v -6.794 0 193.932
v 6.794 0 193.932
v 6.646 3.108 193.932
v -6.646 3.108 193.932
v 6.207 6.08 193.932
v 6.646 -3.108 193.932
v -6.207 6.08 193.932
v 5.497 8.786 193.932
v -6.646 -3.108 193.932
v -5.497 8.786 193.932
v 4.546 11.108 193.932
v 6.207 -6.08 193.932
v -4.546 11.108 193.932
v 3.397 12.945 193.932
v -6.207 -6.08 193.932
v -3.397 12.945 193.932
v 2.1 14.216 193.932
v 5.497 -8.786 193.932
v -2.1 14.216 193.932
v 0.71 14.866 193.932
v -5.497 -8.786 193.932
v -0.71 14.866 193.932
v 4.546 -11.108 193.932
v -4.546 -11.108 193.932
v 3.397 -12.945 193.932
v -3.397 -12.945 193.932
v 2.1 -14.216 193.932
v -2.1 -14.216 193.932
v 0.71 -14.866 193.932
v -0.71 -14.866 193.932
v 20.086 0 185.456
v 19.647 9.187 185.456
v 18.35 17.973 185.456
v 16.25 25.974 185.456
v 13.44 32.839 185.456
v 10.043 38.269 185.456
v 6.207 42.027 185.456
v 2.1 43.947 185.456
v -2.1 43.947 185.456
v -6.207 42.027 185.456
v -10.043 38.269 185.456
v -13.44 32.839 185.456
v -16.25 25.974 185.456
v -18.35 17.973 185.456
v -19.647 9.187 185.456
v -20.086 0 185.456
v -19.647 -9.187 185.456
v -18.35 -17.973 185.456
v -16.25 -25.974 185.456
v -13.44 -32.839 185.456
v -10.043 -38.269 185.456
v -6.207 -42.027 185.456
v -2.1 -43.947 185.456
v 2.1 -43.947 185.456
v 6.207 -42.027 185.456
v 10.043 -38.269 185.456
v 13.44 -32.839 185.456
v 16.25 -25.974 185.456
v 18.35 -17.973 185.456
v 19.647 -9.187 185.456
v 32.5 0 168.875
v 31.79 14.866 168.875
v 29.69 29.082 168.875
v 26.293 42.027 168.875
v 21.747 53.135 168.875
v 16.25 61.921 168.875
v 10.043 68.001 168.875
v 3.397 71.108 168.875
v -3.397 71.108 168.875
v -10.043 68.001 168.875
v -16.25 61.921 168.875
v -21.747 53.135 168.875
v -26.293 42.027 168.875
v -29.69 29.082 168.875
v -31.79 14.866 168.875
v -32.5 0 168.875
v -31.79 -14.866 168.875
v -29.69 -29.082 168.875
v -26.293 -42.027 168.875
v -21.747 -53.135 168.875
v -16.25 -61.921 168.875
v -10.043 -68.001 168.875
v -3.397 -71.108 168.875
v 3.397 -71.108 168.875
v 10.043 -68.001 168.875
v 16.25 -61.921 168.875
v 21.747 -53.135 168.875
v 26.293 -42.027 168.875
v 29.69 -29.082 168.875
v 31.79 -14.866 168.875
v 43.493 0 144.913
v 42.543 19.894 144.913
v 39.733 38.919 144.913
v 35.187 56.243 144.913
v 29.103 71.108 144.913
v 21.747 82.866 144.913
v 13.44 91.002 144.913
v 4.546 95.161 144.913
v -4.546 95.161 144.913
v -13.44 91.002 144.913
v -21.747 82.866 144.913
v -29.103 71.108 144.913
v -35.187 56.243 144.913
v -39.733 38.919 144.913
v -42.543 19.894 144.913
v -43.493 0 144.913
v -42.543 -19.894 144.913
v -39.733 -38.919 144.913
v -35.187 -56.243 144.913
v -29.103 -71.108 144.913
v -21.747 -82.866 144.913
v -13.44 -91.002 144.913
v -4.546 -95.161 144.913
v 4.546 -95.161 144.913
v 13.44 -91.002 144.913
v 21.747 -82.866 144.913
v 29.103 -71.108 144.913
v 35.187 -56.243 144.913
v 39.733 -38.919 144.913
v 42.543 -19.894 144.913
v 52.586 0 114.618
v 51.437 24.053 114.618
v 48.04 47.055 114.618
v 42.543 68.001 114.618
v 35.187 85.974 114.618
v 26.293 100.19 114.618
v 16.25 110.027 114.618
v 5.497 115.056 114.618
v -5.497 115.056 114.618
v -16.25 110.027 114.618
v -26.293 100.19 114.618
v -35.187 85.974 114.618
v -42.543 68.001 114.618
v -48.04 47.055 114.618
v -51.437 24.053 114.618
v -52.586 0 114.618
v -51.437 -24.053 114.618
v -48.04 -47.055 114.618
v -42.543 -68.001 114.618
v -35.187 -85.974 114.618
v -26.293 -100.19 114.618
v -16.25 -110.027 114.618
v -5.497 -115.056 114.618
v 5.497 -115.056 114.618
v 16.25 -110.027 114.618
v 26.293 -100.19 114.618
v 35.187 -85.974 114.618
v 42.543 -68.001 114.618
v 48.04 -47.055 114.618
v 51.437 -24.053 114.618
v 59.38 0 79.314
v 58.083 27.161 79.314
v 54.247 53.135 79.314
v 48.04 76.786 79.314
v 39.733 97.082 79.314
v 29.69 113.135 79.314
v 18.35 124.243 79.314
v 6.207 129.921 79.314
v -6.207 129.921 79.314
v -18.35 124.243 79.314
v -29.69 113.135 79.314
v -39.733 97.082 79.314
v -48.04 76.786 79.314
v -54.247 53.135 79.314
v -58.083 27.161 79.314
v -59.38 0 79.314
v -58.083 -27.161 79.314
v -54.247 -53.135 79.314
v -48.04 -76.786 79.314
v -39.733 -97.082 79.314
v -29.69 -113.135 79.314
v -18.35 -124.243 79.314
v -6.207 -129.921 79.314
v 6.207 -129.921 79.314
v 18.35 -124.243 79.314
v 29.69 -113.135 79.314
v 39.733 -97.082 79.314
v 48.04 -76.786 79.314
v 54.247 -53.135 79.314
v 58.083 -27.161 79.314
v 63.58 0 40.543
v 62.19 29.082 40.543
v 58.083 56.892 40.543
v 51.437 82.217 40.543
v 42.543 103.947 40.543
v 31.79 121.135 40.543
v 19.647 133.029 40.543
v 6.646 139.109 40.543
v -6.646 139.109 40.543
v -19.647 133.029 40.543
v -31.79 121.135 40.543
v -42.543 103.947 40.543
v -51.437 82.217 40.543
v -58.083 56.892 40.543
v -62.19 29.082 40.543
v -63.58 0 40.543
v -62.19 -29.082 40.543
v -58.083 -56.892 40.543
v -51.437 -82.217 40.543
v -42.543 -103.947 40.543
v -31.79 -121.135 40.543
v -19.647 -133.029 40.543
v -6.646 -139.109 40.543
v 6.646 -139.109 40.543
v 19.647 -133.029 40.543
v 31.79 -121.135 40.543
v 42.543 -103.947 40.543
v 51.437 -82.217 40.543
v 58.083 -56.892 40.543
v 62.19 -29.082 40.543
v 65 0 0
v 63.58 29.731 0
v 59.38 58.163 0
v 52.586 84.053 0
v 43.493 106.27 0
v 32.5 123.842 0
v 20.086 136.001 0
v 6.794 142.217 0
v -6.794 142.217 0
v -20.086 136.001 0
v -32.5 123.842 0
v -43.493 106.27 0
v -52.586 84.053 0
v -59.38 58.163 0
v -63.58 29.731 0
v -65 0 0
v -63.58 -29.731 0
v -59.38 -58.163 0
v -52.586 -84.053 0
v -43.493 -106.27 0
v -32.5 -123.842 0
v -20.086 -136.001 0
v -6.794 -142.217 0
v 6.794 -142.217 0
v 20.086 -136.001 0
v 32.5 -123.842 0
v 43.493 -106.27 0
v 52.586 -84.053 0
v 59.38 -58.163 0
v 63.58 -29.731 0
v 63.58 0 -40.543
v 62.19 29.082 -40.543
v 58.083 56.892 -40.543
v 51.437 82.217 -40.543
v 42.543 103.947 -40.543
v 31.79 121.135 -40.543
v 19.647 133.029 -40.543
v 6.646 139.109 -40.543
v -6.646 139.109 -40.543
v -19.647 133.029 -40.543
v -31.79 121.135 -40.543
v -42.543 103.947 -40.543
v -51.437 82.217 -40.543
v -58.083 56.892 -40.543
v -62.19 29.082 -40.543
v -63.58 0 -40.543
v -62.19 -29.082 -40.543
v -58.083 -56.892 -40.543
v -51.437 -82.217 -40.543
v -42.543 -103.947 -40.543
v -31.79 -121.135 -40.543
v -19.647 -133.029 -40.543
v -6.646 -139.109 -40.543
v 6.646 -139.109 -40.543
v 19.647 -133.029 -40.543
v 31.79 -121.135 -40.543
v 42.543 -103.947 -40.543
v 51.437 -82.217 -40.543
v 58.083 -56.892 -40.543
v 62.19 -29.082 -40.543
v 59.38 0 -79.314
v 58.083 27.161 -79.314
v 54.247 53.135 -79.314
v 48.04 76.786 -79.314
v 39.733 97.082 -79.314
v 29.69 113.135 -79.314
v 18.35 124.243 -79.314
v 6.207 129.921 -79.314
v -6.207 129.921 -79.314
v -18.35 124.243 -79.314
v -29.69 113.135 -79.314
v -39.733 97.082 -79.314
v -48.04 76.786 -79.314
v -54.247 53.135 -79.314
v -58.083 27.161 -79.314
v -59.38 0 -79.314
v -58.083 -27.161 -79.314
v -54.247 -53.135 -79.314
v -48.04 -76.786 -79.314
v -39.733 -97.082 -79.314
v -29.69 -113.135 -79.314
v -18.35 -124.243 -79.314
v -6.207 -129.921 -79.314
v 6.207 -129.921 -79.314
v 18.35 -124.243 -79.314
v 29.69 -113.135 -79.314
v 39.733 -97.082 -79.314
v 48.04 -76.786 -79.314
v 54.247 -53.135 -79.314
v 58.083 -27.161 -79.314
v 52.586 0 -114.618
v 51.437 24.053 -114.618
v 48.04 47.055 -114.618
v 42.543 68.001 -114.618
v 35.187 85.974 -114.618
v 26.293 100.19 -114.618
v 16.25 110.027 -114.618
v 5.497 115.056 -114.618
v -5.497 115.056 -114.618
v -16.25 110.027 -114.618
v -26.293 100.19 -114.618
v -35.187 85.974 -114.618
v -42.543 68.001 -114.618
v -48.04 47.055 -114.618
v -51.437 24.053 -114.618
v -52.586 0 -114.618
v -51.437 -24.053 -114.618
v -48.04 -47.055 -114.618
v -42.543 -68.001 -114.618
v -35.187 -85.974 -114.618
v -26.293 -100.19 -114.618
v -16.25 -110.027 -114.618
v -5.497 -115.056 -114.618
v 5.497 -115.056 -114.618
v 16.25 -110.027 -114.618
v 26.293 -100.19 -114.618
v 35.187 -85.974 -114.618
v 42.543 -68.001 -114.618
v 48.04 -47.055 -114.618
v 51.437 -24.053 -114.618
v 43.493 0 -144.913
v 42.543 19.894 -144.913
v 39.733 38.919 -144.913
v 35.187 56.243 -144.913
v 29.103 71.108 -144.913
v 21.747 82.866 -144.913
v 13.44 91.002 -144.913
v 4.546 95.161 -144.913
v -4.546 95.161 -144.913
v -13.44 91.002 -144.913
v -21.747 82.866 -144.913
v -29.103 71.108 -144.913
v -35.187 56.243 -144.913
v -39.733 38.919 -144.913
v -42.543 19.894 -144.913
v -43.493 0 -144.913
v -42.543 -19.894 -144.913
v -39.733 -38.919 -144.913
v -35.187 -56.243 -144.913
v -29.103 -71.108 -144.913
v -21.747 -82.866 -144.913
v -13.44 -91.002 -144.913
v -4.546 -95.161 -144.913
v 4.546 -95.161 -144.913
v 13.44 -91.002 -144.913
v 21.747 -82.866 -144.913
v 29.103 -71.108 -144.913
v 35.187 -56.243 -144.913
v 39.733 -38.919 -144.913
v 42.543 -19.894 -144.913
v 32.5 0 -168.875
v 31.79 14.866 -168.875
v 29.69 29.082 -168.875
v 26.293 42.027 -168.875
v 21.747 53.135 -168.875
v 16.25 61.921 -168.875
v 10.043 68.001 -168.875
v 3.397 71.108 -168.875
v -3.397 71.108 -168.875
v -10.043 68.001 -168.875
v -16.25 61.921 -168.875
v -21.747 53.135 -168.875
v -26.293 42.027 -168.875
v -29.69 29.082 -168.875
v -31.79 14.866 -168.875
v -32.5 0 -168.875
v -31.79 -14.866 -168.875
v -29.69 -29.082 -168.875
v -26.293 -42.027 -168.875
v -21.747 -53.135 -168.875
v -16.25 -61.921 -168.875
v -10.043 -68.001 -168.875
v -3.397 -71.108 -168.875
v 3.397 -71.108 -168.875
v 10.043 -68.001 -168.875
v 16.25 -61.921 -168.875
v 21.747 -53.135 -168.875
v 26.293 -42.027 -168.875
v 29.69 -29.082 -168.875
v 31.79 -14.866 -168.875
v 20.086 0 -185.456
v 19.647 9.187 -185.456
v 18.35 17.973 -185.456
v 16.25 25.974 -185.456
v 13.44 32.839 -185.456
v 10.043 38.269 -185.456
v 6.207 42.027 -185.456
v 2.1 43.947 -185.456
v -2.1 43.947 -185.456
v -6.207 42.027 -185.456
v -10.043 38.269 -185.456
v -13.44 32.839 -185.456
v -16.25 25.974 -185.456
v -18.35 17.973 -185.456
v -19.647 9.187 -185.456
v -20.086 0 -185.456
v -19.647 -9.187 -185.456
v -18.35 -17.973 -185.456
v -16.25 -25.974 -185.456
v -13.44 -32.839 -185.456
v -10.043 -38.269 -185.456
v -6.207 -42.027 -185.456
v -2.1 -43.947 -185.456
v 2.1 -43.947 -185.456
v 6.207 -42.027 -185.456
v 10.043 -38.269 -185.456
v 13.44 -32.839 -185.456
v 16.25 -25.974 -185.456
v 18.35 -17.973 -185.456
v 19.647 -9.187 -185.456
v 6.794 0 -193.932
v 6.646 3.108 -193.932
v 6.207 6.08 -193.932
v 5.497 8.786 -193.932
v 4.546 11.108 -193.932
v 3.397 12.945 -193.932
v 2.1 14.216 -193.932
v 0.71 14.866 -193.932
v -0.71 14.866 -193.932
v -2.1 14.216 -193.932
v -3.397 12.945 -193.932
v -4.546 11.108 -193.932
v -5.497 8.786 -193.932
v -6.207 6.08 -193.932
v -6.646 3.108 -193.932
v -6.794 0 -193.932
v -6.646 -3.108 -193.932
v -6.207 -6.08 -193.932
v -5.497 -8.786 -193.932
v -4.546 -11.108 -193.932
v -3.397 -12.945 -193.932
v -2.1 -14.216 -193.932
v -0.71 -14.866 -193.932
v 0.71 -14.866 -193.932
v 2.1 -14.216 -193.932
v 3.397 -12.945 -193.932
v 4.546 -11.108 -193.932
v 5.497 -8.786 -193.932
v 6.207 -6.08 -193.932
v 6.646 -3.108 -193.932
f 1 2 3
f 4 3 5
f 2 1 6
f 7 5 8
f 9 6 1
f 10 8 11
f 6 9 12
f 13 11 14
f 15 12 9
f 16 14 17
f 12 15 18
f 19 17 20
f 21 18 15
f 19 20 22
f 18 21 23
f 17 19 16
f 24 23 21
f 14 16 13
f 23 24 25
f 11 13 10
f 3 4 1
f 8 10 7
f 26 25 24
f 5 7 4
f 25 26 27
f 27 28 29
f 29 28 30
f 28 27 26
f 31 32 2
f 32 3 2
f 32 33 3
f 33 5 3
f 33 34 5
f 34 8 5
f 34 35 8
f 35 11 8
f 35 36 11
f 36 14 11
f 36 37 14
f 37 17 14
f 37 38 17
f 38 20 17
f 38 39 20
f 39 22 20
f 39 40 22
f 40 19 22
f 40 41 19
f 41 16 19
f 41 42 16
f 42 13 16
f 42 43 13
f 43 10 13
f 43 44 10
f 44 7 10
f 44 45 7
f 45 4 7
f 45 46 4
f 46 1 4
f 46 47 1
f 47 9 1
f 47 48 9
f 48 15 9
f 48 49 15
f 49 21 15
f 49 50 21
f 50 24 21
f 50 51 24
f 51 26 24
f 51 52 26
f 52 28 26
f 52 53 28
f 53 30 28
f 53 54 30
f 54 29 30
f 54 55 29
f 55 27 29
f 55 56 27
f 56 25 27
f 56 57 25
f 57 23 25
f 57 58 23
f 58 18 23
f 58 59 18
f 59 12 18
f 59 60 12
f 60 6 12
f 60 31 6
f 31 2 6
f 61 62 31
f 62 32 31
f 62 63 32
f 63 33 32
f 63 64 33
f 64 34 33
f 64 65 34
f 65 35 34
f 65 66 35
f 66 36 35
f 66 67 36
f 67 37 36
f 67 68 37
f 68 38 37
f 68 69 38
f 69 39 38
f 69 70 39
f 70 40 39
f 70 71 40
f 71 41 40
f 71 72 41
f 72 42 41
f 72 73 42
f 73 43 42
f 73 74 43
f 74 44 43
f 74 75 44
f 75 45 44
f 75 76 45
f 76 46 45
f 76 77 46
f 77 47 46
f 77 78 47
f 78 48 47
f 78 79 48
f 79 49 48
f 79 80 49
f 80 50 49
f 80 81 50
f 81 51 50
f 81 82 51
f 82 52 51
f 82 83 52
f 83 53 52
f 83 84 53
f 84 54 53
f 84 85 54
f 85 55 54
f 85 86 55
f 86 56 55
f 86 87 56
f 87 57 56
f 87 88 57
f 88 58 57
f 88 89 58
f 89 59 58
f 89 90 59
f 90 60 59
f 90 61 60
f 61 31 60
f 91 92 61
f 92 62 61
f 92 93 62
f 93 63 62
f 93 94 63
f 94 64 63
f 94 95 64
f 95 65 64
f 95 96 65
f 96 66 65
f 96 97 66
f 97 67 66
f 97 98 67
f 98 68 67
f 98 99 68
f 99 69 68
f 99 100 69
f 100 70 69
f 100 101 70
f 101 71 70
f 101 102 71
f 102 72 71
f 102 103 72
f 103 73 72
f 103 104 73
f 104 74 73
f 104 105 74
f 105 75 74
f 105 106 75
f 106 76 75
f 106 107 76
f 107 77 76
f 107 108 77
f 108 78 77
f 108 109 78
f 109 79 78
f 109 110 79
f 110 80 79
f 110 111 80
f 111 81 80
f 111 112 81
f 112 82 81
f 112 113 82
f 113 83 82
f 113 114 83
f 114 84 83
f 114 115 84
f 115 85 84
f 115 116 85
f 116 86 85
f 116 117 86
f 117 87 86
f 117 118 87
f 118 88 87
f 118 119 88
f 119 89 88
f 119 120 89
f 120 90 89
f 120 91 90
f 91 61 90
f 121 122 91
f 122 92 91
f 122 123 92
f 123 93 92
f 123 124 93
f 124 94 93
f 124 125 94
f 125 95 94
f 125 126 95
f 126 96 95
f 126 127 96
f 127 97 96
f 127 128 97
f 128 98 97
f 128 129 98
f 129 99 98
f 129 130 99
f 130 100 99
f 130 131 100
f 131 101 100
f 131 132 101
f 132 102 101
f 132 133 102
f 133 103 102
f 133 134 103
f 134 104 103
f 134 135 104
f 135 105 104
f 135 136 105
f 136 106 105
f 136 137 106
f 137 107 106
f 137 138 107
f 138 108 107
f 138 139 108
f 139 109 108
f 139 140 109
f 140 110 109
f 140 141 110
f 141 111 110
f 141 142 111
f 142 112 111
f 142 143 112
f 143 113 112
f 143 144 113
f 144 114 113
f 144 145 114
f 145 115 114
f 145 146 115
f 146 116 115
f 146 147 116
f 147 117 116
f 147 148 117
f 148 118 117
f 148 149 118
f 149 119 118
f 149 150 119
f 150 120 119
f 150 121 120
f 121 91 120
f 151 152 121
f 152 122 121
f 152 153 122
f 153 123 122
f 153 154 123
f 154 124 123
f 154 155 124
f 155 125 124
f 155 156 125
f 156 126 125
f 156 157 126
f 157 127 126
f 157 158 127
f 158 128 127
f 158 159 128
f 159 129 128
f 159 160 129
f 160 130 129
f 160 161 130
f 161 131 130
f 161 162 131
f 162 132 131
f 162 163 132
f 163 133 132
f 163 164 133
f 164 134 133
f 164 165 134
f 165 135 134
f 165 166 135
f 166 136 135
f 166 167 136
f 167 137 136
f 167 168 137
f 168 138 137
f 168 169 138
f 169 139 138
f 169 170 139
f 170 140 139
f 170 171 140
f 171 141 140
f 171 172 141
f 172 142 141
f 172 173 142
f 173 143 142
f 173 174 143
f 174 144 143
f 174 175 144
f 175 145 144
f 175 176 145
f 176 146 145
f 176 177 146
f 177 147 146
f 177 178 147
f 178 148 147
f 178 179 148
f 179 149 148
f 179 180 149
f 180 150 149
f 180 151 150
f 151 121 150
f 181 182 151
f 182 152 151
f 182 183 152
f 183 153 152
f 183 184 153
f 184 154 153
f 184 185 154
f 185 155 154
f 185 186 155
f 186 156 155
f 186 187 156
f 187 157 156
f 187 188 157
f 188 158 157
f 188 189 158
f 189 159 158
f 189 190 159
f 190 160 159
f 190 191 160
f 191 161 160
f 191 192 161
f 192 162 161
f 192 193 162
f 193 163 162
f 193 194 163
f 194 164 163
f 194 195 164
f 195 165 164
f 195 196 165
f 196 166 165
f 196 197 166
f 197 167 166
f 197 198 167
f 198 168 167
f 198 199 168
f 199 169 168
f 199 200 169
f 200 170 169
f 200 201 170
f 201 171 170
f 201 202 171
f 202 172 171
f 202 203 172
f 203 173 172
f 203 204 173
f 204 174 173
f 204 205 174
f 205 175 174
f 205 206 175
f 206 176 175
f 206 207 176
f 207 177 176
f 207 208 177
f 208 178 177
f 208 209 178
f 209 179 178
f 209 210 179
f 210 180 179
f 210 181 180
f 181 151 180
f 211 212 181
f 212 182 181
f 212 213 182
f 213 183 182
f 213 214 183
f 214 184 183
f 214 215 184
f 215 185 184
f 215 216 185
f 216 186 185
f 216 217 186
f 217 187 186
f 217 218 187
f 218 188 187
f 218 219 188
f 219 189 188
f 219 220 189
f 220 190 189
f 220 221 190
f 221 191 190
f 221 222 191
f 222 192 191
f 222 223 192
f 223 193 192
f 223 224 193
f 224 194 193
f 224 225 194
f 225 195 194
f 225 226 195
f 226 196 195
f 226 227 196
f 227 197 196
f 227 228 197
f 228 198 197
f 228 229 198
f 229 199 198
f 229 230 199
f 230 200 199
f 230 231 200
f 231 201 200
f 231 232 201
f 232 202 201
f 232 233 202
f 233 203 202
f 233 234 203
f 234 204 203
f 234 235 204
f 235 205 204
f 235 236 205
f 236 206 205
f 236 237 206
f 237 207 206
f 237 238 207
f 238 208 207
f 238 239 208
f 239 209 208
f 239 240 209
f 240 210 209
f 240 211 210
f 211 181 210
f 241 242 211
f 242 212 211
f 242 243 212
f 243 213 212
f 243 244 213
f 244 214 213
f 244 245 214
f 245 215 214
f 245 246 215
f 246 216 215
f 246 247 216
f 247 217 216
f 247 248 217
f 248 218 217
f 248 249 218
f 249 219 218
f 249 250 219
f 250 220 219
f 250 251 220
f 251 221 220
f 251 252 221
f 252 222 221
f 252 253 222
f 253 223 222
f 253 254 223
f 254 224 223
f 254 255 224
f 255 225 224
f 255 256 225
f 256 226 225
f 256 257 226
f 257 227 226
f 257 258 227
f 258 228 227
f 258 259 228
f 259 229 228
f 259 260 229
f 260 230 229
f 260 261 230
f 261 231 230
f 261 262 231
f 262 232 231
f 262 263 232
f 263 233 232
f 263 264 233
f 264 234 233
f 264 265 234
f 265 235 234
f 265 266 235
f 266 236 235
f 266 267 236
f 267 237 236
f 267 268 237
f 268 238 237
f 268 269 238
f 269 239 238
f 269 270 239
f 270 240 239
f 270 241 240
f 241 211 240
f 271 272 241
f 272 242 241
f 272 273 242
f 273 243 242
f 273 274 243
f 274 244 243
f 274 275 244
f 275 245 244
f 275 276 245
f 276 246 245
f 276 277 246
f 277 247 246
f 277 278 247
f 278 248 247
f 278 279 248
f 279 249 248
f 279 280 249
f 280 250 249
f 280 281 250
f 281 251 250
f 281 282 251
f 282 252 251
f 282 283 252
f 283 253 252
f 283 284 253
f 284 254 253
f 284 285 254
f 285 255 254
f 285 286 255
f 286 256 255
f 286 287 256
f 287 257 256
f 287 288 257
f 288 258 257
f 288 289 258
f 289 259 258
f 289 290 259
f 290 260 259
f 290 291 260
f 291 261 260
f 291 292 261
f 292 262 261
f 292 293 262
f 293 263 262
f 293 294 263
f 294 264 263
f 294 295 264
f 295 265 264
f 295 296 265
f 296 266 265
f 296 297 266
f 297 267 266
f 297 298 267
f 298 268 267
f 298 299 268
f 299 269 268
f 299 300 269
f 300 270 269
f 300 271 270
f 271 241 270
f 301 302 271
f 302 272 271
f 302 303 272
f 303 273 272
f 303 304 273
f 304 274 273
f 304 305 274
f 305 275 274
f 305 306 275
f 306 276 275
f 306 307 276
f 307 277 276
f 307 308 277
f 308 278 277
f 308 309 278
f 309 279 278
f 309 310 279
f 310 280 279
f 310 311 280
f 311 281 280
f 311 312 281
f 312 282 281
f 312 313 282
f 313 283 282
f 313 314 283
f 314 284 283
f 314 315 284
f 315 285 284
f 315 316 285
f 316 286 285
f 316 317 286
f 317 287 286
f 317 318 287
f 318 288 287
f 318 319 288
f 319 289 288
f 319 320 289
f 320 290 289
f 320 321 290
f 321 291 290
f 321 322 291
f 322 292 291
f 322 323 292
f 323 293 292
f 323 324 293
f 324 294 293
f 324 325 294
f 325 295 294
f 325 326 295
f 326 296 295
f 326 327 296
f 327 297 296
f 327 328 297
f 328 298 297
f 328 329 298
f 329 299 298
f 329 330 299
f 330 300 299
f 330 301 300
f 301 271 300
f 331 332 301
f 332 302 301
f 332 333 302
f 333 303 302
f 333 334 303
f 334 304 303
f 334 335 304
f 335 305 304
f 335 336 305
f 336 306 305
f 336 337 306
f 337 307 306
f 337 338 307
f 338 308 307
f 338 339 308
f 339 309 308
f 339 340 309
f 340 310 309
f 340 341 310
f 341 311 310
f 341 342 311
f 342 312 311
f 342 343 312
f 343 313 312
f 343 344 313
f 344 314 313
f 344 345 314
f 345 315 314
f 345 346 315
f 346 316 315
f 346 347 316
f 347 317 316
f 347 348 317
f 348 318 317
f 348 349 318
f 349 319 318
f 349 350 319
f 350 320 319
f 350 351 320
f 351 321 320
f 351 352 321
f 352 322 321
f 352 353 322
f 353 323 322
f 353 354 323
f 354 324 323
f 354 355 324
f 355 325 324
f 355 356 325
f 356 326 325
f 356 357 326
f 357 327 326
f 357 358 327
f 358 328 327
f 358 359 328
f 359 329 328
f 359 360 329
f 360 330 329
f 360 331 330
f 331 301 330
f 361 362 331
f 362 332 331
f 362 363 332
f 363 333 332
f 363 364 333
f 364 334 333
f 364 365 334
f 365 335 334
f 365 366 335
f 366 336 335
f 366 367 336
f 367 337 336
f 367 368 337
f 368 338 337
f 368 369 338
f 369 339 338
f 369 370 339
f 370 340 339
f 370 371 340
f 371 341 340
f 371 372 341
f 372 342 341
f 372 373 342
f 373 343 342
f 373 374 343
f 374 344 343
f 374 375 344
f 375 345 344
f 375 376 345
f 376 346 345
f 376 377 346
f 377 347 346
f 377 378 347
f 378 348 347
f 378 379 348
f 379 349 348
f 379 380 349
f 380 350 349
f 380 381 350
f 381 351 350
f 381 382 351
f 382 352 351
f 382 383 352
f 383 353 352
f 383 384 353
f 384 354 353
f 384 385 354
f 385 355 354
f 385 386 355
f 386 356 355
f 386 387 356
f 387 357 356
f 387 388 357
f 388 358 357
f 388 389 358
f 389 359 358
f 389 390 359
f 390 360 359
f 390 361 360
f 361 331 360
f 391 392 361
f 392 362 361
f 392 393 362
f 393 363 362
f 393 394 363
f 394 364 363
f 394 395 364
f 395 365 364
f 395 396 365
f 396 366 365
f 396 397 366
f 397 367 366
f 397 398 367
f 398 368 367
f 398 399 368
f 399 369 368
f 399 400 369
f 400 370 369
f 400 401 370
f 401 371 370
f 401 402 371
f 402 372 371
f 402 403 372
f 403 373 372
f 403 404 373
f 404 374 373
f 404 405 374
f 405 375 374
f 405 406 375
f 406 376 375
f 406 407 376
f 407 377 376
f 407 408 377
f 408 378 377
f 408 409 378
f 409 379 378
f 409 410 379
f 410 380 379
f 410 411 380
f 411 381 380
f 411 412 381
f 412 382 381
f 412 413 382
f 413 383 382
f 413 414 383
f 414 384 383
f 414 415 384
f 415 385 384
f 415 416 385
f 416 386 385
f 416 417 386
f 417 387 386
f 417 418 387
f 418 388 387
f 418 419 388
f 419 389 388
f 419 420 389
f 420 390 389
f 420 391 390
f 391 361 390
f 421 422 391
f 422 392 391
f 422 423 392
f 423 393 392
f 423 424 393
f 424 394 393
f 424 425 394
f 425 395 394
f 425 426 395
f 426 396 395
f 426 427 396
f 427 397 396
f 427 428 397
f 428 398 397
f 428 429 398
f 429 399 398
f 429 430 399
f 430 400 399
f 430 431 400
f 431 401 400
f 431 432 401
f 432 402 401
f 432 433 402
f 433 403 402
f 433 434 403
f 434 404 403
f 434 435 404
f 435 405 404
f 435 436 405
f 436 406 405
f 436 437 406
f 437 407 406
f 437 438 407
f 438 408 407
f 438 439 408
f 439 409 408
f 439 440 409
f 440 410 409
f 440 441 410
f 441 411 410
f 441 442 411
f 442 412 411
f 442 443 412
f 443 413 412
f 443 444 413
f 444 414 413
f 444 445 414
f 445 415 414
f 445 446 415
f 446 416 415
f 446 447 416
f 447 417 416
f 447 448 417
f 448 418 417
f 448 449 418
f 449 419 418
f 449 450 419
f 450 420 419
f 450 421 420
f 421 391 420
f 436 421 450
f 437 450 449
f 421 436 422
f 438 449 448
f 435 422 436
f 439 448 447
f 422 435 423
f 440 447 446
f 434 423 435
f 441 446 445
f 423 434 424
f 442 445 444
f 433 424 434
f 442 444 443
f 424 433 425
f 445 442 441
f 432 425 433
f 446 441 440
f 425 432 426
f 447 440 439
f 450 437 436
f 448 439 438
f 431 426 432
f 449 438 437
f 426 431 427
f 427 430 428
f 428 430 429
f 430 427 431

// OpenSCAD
// Generated by SolidPython 1.0.1 on 2020-07-29 00:46:46


scale(v = [5, 11, 15]) {
	sphere(r = 13);
}
/***********************************************
*********      SolidPython code:      **********
************************************************
 
# import packages: SolidPython
from solid import *
from solid.utils import *
from itertools import chain, combinations, permutations


class Resize:

    def __init__(self, scad_file):
        self.scad_file = scad_file
        #self.scad_file = import_scad(scad_file)
        # cone/cylinder param:
        self.r1 = 0
        self.r2 = 0
        self.h = 0
        # rectangular prism param:
        self.w = 0
        self.l = 0
        # ellipse param:
        self.r = 0

    # import OpenScad code (file name corresponds to shape)


    # classify shape + parameters
    def assign(self, param1, param2, param3):
        if self.scad_file == 'cone.scad':
            self.r1 = param1
            self.r2 = param2
            self.h = param3
        elif self.scad_file == 'cylinder.scad':
            self.r1 = param1
            self.r2 = param2
            self.h = param3
        elif self.scad_file == 'rectangularPrism.scad':
            self.h = param1
            self.l = param2
            self.w = param3
        else:
            self.r = param1
            self.h = param2

    # resize parameters
    def iterate(self):
        x = range(3, 20, 2)
        i = 1
        if self.scad_file == 'cone.scad':
            tempList = list(permutations(x, 2))
            for temp in tempList:
                param1 = temp[0]
                param2 = temp[1]
                filepath = 'produced_scad_files/' + 'cone' + str(param1) + '_' + str(param2) + '_' + '.scad'
                scad_render_to_file(cylinder(h=param1, r1=param2, r2=0), filepath)

        elif self.scad_file == 'cylinder.scad':
            tempList = list(permutations(x, 3))
            for temp in tempList:
                param1 = temp[0]
                param2 = temp[1]
                filepath = 'produced_scad_files/' + 'cylinder' + str(param1) + '_' + str(param2) + '_' + '.scad'
                scad_render_to_file(cylinder(h=param1, r1=param2, r2=param2), filepath)

        elif self.scad_file == 'rectangularPrism.scad':
            tempList = list(permutations(x, 3))
            for temp in tempList:
                param1 = temp[0]
                param2 = temp[1]
                param3 = temp[2]
                filepath = 'produced_scad_files/' + 'rectangularPrism' + str(param1) + '_' + str(param2) + '_' + str(
                    param3) + '.scad'
                scad_render_to_file(cube(size=(param1, param2, param3)), filepath)

        elif self.scad_file == 'ellipse.scad':
            tempList = list(permutations(x, 4))
            for temp in tempList:
                param1 = temp[0]
                param2 = temp[1]
                param3 = temp[2]
                param4 = temp[3]
                filepath = 'produced_scad_files/' + 'ellipse' + str(param1) + '_' + str(param2) + '_' + str(param3) + '_' + str(param4) + '.scad'
                scad_render_to_file(scale([param1, param2, param3])(sphere(r=param4)), filepath)

    def render_to_scadfile(self):
        scad_render_to_file(scad, 'example.scad') 
 
************************************************/
